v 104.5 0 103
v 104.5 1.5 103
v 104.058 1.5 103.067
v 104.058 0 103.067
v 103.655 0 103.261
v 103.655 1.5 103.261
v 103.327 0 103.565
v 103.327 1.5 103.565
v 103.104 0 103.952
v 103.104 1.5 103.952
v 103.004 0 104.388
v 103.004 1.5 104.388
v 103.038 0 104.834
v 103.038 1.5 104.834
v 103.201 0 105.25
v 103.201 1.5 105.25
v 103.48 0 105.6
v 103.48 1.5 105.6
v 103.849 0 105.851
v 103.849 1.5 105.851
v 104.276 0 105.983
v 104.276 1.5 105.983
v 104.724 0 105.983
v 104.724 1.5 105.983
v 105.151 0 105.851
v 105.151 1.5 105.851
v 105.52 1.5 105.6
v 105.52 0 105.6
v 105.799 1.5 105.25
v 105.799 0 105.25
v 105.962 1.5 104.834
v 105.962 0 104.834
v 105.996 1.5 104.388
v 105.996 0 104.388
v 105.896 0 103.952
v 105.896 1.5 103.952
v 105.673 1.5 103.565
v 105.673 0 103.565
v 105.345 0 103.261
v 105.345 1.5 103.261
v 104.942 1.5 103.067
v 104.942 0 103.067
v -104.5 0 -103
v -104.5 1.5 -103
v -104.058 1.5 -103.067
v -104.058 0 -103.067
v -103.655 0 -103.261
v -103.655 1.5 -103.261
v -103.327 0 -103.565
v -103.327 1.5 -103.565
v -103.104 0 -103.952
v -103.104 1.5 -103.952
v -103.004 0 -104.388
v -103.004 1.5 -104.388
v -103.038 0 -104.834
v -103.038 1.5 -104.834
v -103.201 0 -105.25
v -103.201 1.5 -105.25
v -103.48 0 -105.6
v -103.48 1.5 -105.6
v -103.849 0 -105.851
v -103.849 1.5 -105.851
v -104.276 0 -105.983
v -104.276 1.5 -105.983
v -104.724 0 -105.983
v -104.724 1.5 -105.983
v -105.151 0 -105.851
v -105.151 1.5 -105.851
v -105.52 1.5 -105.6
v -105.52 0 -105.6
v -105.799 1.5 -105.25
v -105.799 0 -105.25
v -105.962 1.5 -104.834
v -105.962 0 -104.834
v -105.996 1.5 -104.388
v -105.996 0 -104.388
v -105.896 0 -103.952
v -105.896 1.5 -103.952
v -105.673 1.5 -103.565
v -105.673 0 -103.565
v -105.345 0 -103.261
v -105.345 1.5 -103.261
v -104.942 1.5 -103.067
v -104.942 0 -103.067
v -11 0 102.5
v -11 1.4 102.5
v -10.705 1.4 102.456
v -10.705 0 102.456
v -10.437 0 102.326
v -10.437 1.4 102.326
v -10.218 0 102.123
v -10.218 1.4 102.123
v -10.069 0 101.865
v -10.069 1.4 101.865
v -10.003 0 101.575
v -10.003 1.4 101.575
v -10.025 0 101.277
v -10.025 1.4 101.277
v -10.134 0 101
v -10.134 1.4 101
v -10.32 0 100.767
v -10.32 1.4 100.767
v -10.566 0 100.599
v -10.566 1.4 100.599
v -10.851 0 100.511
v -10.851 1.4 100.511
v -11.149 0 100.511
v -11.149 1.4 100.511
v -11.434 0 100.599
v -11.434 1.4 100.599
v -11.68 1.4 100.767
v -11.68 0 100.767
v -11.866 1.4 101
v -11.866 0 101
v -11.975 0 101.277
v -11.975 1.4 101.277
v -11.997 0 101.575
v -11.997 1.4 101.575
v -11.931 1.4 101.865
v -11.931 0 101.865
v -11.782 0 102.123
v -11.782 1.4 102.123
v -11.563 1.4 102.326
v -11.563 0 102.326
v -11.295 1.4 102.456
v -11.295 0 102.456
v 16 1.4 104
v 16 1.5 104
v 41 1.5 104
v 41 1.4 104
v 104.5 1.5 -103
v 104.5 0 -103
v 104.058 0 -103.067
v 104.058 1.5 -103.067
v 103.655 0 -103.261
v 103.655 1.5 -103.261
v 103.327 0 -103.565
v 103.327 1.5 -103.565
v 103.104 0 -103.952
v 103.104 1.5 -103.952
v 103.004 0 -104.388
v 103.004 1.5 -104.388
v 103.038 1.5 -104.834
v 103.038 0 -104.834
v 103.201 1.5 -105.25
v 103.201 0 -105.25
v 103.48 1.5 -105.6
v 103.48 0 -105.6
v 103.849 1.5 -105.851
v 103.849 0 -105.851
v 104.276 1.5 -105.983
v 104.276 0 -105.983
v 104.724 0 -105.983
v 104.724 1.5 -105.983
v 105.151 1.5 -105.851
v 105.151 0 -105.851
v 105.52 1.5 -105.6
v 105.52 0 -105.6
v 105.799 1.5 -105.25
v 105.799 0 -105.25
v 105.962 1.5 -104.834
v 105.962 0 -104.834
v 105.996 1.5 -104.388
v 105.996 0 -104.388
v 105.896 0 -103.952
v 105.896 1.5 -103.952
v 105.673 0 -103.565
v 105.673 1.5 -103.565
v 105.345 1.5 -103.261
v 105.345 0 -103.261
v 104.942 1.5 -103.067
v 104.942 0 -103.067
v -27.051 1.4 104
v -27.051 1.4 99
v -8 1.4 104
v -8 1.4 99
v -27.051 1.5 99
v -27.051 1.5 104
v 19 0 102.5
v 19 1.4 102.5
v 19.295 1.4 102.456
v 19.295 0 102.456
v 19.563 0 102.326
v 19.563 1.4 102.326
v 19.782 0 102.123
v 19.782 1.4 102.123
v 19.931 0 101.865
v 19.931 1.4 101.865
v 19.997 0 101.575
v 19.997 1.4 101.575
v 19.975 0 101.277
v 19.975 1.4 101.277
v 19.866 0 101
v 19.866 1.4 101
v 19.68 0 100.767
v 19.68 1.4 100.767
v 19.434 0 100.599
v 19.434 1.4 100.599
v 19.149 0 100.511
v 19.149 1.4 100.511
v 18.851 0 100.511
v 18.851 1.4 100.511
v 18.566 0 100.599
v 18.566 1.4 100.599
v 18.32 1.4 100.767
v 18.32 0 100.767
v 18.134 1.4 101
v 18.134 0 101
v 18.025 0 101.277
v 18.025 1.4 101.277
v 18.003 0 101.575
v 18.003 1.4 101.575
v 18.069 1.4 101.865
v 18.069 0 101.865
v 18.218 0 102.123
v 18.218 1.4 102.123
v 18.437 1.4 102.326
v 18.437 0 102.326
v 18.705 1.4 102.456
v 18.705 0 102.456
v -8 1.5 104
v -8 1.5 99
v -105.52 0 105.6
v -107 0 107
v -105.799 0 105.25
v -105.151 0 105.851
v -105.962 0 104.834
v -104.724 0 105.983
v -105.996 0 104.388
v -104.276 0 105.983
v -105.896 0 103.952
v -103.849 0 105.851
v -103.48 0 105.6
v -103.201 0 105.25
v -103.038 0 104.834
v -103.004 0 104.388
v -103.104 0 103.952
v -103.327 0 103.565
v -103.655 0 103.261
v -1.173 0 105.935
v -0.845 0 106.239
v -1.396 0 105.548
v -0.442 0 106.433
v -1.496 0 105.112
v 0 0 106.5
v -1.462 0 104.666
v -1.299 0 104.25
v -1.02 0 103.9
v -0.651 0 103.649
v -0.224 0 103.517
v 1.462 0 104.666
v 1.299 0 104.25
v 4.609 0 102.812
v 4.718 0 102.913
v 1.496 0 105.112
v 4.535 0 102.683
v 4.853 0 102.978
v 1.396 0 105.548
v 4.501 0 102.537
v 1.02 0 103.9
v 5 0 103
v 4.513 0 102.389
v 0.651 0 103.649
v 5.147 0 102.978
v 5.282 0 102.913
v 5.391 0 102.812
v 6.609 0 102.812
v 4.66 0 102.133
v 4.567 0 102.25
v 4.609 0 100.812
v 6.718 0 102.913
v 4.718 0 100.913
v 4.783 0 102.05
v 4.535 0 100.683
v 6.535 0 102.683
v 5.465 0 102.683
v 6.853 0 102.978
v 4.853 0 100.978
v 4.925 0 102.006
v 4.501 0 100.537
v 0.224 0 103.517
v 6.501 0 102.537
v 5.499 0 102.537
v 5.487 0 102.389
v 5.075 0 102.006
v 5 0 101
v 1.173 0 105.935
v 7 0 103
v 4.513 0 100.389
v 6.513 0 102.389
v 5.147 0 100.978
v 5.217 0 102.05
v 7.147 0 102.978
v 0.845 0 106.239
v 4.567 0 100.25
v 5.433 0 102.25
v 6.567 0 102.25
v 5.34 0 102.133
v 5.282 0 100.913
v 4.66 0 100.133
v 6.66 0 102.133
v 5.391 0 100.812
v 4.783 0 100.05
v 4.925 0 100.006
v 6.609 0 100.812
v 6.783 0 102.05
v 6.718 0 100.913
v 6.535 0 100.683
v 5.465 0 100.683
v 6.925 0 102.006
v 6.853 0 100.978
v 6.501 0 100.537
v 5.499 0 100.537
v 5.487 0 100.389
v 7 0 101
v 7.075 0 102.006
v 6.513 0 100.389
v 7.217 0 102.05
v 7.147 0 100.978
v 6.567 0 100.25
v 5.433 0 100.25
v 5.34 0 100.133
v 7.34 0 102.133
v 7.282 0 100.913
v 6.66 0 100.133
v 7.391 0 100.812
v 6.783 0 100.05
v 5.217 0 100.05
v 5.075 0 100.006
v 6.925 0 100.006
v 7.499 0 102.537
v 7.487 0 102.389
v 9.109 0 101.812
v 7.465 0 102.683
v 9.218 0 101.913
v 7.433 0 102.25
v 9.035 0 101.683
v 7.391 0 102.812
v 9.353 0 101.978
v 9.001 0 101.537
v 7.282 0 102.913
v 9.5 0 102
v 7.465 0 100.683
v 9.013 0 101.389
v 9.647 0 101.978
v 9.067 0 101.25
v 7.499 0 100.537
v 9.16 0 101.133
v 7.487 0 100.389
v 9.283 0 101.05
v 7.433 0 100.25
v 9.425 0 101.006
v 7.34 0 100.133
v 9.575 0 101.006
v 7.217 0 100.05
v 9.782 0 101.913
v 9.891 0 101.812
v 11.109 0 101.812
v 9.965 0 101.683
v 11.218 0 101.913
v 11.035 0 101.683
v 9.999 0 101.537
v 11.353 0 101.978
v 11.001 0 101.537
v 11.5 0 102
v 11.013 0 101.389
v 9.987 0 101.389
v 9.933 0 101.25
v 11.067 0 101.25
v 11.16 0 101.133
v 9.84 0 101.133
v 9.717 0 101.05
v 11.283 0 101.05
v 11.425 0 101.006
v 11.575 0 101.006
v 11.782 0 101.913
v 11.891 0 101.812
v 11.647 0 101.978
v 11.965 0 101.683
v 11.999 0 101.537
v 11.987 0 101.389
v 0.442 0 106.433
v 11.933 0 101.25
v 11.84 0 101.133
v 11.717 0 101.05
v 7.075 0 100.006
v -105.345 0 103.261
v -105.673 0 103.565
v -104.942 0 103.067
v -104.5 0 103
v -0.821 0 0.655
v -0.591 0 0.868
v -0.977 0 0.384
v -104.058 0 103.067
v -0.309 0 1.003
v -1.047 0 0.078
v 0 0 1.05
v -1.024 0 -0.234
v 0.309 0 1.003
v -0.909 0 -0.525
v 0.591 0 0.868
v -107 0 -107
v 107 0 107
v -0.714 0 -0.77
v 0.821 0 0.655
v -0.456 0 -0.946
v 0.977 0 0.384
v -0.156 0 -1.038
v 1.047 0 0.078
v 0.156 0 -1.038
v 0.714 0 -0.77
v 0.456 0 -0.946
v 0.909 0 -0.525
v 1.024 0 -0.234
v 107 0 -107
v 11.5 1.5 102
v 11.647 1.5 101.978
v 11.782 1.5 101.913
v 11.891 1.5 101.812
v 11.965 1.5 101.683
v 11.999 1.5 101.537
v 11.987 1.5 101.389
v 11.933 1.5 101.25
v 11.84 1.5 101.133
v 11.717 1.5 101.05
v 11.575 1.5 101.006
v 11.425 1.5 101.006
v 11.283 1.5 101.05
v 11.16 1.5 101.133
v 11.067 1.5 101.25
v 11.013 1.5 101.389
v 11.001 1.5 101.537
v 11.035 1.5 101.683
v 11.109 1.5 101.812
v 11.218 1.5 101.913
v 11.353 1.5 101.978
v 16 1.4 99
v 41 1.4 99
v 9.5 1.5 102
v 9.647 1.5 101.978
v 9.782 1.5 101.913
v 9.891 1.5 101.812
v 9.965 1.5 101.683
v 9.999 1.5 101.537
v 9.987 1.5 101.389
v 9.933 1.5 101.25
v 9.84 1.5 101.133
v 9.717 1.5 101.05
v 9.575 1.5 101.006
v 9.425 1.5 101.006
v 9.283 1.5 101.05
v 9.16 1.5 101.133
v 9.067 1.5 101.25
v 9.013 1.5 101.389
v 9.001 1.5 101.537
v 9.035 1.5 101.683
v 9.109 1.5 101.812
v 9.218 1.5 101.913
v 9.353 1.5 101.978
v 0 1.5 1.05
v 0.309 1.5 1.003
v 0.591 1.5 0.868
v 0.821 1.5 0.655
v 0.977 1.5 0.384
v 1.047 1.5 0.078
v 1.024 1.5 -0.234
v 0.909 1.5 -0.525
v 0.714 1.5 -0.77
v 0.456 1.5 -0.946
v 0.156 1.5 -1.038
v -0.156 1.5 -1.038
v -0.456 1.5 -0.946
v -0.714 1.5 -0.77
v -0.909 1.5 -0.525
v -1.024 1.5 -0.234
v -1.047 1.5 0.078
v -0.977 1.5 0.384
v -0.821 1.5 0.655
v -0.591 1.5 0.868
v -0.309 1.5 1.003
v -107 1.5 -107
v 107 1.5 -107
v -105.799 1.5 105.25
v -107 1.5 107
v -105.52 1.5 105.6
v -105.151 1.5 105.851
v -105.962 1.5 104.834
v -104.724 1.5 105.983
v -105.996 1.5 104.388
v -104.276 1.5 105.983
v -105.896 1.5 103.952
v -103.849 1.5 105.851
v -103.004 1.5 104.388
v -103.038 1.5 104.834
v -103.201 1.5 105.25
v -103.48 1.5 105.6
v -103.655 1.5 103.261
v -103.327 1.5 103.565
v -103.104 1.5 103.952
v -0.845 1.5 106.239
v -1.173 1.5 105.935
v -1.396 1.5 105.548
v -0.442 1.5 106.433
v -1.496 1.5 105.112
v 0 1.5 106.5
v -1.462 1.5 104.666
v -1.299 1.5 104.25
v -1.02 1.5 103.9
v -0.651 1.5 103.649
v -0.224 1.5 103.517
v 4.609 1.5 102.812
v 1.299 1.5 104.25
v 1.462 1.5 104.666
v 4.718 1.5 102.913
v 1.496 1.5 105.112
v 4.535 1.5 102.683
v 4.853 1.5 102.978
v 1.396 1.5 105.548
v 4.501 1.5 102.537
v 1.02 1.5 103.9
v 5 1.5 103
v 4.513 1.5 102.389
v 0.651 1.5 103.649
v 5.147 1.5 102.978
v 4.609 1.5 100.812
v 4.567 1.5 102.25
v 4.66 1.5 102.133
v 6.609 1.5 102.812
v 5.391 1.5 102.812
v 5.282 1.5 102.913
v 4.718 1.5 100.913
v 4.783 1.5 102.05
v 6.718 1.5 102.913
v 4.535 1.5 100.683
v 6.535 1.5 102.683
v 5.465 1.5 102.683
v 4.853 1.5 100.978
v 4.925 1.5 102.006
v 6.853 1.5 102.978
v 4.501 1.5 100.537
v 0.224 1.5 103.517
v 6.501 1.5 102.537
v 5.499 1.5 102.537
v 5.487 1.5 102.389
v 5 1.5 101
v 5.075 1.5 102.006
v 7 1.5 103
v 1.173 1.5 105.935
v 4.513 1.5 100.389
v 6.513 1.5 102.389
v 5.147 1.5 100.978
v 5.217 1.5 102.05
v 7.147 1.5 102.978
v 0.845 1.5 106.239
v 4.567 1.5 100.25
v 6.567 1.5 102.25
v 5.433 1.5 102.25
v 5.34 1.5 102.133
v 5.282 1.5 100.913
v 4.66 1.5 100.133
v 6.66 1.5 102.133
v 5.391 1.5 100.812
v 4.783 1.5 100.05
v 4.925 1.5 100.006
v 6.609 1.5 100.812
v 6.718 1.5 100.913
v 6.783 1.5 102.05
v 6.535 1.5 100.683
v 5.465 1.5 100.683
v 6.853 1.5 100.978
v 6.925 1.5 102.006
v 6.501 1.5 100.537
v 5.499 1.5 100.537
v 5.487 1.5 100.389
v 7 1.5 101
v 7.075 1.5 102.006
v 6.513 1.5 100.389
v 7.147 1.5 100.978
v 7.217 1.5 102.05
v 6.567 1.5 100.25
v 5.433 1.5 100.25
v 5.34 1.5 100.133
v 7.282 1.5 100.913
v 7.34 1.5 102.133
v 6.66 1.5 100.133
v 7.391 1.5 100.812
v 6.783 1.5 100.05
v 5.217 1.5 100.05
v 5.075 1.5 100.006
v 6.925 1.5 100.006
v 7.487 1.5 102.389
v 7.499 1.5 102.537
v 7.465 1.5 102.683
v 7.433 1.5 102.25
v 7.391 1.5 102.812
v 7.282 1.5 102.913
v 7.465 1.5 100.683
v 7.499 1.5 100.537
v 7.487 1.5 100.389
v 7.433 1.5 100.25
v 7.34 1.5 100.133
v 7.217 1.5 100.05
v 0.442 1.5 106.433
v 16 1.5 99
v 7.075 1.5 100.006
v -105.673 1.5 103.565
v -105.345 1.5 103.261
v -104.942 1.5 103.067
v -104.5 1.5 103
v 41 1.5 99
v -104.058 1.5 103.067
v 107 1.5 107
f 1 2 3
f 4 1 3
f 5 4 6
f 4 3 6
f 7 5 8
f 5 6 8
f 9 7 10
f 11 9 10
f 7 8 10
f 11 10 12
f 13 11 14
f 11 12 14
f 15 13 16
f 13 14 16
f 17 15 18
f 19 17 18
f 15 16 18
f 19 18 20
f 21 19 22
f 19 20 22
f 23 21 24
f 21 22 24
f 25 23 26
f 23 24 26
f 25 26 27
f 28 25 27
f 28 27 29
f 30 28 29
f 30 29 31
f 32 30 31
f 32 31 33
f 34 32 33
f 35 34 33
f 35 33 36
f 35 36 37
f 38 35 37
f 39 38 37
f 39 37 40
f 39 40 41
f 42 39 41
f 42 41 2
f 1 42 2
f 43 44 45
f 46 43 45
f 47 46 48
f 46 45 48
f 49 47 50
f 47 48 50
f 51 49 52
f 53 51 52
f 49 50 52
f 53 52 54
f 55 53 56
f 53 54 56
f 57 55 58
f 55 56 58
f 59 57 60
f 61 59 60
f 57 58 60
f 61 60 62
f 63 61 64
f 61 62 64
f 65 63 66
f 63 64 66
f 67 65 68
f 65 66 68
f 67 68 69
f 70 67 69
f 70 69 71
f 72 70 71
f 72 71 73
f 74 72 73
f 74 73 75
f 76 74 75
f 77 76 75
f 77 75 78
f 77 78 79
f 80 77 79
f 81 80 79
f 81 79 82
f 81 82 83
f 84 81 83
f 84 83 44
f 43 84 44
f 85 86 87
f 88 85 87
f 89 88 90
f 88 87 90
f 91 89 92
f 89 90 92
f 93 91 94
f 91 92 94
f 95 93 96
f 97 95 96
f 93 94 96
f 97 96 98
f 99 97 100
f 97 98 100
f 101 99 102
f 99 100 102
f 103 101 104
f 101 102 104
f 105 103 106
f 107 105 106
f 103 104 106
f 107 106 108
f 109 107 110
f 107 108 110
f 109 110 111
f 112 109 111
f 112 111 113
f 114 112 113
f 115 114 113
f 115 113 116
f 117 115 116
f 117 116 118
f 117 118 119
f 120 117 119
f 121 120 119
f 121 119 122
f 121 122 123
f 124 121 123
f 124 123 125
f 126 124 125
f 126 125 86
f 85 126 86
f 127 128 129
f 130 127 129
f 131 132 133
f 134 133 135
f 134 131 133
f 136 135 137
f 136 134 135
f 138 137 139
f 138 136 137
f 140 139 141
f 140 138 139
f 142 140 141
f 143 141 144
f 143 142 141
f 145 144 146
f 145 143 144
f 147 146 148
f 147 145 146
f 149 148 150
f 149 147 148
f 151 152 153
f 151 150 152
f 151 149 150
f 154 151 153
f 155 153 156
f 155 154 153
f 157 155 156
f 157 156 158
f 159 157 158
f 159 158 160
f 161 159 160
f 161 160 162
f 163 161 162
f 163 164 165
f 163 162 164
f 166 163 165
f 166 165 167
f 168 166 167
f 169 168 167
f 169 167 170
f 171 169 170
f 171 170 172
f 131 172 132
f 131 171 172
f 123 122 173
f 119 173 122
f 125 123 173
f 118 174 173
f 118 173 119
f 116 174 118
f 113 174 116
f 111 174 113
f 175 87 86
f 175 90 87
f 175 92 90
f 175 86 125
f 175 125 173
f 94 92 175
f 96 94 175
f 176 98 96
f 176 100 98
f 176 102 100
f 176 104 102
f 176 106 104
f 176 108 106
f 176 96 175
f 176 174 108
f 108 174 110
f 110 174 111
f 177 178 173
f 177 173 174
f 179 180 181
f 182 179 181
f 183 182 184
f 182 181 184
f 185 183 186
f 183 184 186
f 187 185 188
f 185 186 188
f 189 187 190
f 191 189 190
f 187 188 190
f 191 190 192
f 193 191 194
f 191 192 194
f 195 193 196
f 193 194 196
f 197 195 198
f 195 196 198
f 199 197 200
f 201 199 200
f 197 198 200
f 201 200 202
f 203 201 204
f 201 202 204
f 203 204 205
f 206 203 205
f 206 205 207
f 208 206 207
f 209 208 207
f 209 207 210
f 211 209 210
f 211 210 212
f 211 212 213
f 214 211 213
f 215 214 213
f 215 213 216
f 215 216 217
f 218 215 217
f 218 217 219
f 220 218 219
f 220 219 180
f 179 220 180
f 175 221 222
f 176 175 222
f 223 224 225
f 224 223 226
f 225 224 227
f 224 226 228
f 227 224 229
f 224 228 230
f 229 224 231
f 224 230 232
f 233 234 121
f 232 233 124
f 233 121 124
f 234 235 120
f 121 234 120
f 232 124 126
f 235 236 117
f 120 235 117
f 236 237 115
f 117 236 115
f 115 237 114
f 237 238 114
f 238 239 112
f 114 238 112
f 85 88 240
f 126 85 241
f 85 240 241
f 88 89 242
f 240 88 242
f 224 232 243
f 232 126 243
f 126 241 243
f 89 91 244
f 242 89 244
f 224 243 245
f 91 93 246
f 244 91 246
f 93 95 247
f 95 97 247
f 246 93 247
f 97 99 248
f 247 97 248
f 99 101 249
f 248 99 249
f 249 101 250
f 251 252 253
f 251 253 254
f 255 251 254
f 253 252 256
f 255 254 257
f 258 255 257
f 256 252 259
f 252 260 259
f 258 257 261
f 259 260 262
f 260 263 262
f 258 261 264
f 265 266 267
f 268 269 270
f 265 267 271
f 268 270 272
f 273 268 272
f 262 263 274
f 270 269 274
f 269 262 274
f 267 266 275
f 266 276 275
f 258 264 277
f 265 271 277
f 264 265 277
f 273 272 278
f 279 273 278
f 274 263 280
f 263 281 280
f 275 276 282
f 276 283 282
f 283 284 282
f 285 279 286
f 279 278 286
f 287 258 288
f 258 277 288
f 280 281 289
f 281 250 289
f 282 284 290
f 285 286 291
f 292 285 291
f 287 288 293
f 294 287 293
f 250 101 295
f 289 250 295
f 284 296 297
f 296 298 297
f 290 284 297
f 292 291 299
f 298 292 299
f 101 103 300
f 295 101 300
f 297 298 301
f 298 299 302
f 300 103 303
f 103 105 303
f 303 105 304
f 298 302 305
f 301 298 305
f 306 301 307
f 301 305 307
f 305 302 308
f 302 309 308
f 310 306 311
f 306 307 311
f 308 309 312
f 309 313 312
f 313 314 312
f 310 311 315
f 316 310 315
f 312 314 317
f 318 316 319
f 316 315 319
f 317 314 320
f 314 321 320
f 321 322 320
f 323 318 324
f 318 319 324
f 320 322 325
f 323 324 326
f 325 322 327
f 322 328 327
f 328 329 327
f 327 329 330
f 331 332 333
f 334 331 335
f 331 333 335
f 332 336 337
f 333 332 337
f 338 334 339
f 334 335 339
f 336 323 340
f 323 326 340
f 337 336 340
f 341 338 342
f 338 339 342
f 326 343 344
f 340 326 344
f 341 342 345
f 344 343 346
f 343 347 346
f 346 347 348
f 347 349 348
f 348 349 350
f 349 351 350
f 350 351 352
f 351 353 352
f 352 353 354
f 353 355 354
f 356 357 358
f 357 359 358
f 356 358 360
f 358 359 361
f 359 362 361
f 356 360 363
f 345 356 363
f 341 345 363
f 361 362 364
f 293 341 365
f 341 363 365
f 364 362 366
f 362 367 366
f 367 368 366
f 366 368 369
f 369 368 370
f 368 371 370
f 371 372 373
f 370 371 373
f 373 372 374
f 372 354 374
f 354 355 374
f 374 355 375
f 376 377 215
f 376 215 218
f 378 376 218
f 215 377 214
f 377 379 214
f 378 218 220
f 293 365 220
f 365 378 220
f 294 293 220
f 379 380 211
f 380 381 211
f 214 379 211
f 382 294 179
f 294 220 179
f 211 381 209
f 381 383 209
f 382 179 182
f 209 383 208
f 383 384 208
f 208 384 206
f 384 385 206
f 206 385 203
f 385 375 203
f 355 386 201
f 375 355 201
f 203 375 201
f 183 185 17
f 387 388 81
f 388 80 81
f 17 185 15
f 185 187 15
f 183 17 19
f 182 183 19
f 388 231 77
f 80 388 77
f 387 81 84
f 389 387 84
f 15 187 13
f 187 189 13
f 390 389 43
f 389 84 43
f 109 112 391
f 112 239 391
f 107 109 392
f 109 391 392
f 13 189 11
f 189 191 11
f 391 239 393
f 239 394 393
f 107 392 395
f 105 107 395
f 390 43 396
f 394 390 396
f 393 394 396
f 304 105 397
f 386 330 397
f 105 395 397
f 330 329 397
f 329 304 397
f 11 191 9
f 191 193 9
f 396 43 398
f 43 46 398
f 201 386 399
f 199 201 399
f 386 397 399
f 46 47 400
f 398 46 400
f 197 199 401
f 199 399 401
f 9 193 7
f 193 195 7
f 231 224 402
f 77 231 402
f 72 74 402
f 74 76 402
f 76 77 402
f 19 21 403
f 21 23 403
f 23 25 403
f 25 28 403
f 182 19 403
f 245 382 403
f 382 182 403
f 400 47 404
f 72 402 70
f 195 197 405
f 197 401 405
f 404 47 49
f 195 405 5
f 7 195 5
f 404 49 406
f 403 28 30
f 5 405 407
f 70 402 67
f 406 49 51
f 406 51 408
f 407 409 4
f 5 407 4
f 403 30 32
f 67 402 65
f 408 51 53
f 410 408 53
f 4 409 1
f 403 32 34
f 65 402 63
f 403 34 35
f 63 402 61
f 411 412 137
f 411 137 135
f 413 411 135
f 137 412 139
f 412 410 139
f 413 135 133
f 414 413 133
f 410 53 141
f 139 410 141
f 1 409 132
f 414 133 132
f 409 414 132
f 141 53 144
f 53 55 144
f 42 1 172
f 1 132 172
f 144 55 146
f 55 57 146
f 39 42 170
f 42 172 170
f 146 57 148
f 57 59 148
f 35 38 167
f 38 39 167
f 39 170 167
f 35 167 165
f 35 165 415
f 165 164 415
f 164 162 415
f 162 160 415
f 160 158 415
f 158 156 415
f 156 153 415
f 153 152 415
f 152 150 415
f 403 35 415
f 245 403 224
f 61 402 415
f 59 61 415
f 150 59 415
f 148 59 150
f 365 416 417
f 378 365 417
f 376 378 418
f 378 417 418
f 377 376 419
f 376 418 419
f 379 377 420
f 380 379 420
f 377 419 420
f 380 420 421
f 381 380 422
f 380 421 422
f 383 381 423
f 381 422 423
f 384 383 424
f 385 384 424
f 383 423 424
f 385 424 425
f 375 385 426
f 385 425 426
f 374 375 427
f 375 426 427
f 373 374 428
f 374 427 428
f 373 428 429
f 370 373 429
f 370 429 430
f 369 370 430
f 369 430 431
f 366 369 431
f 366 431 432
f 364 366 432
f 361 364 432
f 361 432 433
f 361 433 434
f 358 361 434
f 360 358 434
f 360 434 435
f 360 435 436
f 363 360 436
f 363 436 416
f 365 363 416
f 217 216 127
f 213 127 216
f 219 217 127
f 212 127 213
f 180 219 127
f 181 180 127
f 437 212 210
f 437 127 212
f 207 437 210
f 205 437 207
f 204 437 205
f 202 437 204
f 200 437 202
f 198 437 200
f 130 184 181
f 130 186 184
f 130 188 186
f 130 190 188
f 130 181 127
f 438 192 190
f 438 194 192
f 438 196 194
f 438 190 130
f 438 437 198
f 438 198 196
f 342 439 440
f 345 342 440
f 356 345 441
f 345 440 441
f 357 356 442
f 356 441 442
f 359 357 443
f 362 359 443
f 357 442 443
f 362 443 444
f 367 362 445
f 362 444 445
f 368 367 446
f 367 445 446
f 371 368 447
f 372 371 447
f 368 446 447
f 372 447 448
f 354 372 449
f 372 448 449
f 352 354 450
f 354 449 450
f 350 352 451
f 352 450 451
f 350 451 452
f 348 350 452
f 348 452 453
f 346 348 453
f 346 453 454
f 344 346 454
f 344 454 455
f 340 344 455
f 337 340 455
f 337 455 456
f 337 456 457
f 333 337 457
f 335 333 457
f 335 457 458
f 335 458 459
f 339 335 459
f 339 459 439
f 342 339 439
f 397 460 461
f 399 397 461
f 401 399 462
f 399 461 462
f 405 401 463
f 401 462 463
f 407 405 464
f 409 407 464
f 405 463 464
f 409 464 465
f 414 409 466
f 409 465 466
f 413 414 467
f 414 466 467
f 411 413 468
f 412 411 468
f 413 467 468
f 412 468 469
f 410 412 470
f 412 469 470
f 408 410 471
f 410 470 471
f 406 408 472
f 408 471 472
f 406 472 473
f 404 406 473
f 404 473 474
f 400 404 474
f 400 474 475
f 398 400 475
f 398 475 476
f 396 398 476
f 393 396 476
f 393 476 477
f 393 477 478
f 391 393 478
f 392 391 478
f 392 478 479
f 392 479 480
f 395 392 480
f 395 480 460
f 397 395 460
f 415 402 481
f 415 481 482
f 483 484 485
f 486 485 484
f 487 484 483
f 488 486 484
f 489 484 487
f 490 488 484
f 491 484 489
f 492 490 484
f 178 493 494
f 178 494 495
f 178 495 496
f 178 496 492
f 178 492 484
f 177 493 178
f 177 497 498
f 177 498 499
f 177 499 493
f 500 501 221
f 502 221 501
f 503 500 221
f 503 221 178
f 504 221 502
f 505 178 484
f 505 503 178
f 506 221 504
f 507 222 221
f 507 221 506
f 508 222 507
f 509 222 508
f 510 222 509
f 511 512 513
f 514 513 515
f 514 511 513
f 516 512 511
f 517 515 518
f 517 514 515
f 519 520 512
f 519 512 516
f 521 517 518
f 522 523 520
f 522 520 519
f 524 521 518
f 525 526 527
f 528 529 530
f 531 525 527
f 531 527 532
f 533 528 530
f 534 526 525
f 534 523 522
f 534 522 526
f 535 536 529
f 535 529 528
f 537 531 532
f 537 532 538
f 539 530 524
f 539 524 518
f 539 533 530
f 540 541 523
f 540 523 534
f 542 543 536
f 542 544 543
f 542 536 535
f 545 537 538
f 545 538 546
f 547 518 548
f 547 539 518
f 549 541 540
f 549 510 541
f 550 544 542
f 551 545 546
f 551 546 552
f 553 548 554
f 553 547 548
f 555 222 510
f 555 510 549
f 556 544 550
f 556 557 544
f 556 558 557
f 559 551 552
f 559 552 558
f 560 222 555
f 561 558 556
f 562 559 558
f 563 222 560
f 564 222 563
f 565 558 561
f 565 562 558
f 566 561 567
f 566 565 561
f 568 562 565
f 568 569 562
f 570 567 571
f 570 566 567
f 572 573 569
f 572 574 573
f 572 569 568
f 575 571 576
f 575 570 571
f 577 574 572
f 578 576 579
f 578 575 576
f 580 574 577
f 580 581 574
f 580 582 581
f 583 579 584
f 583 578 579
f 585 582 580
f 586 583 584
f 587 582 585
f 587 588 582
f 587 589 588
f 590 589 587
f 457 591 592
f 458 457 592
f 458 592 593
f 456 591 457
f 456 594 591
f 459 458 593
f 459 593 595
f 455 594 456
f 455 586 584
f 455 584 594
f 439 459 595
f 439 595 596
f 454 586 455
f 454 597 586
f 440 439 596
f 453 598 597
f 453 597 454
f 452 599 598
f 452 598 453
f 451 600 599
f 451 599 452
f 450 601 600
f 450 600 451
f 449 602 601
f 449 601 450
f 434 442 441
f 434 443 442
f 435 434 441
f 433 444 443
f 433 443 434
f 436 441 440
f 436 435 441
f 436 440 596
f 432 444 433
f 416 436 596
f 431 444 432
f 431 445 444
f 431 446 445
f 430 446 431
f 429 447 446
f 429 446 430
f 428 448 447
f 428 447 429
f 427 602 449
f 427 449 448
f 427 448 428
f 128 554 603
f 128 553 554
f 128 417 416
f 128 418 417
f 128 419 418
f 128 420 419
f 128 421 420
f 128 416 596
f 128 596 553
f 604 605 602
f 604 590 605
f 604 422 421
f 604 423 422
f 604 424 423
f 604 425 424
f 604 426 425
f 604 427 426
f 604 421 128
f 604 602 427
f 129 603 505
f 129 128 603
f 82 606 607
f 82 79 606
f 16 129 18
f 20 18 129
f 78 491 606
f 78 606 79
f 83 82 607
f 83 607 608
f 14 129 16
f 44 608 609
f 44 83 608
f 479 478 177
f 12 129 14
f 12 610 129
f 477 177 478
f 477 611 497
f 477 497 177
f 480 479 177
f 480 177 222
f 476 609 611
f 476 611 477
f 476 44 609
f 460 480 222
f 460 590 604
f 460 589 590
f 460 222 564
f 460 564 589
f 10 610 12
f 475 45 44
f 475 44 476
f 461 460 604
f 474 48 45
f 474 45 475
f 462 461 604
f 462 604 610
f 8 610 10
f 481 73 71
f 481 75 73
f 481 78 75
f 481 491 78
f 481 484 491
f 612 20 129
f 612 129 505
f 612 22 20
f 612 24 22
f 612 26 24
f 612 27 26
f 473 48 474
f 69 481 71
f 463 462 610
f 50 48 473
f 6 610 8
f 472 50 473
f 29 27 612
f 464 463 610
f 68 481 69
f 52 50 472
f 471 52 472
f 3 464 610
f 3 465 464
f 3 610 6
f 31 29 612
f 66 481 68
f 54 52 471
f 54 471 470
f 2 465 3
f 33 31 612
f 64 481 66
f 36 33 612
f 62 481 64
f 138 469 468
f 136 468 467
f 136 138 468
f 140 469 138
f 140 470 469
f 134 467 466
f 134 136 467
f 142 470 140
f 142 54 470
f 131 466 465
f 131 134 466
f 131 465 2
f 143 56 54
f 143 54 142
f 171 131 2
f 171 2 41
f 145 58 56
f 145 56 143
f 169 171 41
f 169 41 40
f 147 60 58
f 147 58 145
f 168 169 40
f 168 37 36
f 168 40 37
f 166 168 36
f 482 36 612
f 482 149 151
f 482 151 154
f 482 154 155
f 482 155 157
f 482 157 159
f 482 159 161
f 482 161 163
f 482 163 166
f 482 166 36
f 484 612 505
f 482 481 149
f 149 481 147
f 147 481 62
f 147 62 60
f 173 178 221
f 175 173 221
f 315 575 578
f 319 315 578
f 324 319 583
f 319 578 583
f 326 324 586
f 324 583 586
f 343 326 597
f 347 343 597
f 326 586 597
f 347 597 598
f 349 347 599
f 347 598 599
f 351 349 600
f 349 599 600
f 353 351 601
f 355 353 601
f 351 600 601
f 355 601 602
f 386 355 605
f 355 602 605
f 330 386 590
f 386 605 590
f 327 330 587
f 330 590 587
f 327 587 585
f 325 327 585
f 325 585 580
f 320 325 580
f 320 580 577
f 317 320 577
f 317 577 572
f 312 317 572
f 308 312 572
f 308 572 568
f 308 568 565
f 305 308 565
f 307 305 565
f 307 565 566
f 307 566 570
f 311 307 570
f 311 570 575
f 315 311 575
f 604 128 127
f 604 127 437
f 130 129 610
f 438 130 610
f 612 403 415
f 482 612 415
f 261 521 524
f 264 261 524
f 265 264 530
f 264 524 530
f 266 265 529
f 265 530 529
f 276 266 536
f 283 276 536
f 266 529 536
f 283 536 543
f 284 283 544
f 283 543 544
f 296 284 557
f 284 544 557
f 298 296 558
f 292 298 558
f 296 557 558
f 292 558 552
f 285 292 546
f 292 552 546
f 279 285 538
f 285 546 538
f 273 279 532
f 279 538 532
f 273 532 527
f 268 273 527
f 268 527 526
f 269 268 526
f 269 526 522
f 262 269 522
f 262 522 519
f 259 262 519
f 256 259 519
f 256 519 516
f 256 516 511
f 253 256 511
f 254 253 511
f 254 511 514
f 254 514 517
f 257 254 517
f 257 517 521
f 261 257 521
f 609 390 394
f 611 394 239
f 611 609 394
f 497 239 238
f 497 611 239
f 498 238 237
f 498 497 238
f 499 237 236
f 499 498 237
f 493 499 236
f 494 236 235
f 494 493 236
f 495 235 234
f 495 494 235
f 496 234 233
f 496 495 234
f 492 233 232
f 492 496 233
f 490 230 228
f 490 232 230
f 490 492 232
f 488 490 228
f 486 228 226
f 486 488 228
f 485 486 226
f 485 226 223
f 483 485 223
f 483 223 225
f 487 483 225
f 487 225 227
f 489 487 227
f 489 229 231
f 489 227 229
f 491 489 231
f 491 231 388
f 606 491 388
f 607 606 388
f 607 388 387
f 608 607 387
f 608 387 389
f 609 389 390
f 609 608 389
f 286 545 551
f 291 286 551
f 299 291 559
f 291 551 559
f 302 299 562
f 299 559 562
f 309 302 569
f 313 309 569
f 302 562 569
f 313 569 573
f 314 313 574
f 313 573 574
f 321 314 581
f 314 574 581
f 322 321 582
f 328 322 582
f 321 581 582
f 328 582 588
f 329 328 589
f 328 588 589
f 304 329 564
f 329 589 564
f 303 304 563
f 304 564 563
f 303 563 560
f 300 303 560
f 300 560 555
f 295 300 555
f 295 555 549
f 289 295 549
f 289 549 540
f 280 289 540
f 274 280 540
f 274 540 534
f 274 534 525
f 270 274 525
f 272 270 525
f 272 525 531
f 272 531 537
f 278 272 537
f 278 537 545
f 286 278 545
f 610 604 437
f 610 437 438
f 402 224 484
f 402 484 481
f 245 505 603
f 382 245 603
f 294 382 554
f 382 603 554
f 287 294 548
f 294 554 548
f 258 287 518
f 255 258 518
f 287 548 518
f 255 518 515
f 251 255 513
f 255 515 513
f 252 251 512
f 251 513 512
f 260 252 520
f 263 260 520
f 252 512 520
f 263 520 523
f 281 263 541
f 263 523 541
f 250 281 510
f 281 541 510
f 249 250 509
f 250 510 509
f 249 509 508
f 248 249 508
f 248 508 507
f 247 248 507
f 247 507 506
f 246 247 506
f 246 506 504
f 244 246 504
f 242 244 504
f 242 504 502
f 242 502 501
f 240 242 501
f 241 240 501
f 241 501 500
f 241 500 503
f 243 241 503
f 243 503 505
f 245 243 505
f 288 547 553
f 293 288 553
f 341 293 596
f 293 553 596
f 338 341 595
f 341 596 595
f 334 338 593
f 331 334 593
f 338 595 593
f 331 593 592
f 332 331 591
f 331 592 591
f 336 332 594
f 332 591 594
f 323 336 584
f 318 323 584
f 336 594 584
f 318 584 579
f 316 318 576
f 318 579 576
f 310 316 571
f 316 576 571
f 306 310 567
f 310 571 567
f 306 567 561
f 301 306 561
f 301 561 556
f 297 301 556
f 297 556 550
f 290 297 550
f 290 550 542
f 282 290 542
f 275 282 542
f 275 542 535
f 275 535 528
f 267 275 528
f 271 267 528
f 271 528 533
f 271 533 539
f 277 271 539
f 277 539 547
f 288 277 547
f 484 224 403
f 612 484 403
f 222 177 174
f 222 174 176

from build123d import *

# Parameters (mm, degrees)
SKIZZE1_W                       = 214
SKIZZE1_H                       = 214
AUFSATZ_LINEAR_AUSTRAGEN1_DEPTH = 1.5
SKIZZE2_R                       = 1.5
SCHNITT_LINEAR_AUSTRAGEN1_DEPTH = 152.328285525
SPIEGELN2_COPY_1_SKETCH_R       = 1.5
SPIEGELN2_COPY_1_DEPTH          = 152.328285525
SKIZZE3_R                       = 1.5
SKIZZE3_R_2                     = 1
SKIZZE3_R_3                     = 0.5
SKIZZE3_R_4                     = 1.05
SCHNITT_LINEAR_AUSTRAGEN2_DEPTH = 152.328285525
SKIZZE4_W                       = 19.050649498
SKIZZE4_H                       = 5
SKIZZE4_W_2                     = 25
SCHNITT_LINEAR_AUSTRAGEN3_DEPTH = 0.1


with BuildPart() as part:
    # Skizze1 → Aufsatz-Linear austragen1 (new body)
    with BuildSketch(Plane(origin=(0, 0, 0), x_dir=(1, 0, 0), z_dir=(0, 1, 0))):
        Rectangle(SKIZZE1_W, SKIZZE1_H)
    extrude(amount=AUFSATZ_LINEAR_AUSTRAGEN1_DEPTH)

    # Skizze2 → Schnitt-Linear austragen1 (cut, through all)
    with BuildSketch(Plane(origin=(0, 1.5, 0), x_dir=(1, 0, 0), z_dir=(0, 1, 0))):
        with Locations(Location((-104.5, 104.5, 0), (0, 0, 270))):
            Circle(SKIZZE2_R)
    schnitt_linear_austragen1 = extrude(amount=-SCHNITT_LINEAR_AUSTRAGEN1_DEPTH, mode=Mode.SUBTRACT)

    # Spiegeln1: Schnitt-Linear austragen1 across plane
    add(schnitt_linear_austragen1.mirror(Plane.XY), mode=Mode.SUBTRACT)

    # Spiegeln2: Schnitt-Linear austragen1 across plane
    add(schnitt_linear_austragen1.mirror(Plane(origin=(0, 0, 0), x_dir=(0, 0, 1), z_dir=(1, 0, 0))), mode=Mode.SUBTRACT)

    # Spiegeln2 copy 1 sketch → Spiegeln2 copy 1 (cut, through all)
    with BuildSketch(Plane(origin=(0, 1.5, 0), x_dir=(-1, 0, 0), z_dir=(0, 1, 0))):
        with Locations(Location((-104.5, 104.5, 0), (0, 0, 270))):
            Circle(SPIEGELN2_COPY_1_SKETCH_R)
    extrude(amount=-SPIEGELN2_COPY_1_DEPTH, mode=Mode.SUBTRACT)

    # Skizze3 → Schnitt-Linear austragen2 (cut, through all)
    with BuildSketch(Plane(origin=(0, 1.5, 0), x_dir=(1, 0, 0), z_dir=(0, 1, 0))):
        with Locations(Location((0, -105, 0), (0, 0, 270))):
            Circle(SKIZZE3_R)
        with Locations(Location((-11, -101.5, 0), (0, 0, 270))):
            Circle(SKIZZE3_R_2)
        with Locations(Location((19, -101.5, 0), (0, 0, 270))):
            Circle(SKIZZE3_R_2)
        with Locations(Location((5, -100.5, 0), (0, 0, 270))):
            Circle(SKIZZE3_R_3)
        with Locations(Location((5, -102.5, 0), (0, 0, 270))):
            Circle(SKIZZE3_R_3)
        with Locations(Location((7, -100.5, 0), (0, 0, 270))):
            Circle(SKIZZE3_R_3)
        with Locations(Location((7, -102.5, 0), (0, 0, 270))):
            Circle(SKIZZE3_R_3)
        with Locations(Location((9.5, -101.5, 0), (0, 0, 270))):
            Circle(SKIZZE3_R_3)
        with Locations(Location((11.5, -101.5, 0), (0, 0, 270))):
            Circle(SKIZZE3_R_3)
        with Locations(Location((0, 0, 0), (0, 0, 270))):
            Circle(SKIZZE3_R_4)
    extrude(amount=-SCHNITT_LINEAR_AUSTRAGEN2_DEPTH, mode=Mode.SUBTRACT)

    # Skizze4 → Schnitt-Linear austragen3 (cut)
    with BuildSketch(Plane(origin=(0, 1.5, 0), x_dir=(1, 0, 0), z_dir=(0, 1, 0))):
        with Locations((-17.525324749, -101.5)):
            Rectangle(SKIZZE4_W, SKIZZE4_H)
        with Locations((28.5, -101.5)):
            Rectangle(SKIZZE4_W_2, SKIZZE4_H)
    extrude(amount=-SCHNITT_LINEAR_AUSTRAGEN3_DEPTH, mode=Mode.SUBTRACT)


solid = part.part
